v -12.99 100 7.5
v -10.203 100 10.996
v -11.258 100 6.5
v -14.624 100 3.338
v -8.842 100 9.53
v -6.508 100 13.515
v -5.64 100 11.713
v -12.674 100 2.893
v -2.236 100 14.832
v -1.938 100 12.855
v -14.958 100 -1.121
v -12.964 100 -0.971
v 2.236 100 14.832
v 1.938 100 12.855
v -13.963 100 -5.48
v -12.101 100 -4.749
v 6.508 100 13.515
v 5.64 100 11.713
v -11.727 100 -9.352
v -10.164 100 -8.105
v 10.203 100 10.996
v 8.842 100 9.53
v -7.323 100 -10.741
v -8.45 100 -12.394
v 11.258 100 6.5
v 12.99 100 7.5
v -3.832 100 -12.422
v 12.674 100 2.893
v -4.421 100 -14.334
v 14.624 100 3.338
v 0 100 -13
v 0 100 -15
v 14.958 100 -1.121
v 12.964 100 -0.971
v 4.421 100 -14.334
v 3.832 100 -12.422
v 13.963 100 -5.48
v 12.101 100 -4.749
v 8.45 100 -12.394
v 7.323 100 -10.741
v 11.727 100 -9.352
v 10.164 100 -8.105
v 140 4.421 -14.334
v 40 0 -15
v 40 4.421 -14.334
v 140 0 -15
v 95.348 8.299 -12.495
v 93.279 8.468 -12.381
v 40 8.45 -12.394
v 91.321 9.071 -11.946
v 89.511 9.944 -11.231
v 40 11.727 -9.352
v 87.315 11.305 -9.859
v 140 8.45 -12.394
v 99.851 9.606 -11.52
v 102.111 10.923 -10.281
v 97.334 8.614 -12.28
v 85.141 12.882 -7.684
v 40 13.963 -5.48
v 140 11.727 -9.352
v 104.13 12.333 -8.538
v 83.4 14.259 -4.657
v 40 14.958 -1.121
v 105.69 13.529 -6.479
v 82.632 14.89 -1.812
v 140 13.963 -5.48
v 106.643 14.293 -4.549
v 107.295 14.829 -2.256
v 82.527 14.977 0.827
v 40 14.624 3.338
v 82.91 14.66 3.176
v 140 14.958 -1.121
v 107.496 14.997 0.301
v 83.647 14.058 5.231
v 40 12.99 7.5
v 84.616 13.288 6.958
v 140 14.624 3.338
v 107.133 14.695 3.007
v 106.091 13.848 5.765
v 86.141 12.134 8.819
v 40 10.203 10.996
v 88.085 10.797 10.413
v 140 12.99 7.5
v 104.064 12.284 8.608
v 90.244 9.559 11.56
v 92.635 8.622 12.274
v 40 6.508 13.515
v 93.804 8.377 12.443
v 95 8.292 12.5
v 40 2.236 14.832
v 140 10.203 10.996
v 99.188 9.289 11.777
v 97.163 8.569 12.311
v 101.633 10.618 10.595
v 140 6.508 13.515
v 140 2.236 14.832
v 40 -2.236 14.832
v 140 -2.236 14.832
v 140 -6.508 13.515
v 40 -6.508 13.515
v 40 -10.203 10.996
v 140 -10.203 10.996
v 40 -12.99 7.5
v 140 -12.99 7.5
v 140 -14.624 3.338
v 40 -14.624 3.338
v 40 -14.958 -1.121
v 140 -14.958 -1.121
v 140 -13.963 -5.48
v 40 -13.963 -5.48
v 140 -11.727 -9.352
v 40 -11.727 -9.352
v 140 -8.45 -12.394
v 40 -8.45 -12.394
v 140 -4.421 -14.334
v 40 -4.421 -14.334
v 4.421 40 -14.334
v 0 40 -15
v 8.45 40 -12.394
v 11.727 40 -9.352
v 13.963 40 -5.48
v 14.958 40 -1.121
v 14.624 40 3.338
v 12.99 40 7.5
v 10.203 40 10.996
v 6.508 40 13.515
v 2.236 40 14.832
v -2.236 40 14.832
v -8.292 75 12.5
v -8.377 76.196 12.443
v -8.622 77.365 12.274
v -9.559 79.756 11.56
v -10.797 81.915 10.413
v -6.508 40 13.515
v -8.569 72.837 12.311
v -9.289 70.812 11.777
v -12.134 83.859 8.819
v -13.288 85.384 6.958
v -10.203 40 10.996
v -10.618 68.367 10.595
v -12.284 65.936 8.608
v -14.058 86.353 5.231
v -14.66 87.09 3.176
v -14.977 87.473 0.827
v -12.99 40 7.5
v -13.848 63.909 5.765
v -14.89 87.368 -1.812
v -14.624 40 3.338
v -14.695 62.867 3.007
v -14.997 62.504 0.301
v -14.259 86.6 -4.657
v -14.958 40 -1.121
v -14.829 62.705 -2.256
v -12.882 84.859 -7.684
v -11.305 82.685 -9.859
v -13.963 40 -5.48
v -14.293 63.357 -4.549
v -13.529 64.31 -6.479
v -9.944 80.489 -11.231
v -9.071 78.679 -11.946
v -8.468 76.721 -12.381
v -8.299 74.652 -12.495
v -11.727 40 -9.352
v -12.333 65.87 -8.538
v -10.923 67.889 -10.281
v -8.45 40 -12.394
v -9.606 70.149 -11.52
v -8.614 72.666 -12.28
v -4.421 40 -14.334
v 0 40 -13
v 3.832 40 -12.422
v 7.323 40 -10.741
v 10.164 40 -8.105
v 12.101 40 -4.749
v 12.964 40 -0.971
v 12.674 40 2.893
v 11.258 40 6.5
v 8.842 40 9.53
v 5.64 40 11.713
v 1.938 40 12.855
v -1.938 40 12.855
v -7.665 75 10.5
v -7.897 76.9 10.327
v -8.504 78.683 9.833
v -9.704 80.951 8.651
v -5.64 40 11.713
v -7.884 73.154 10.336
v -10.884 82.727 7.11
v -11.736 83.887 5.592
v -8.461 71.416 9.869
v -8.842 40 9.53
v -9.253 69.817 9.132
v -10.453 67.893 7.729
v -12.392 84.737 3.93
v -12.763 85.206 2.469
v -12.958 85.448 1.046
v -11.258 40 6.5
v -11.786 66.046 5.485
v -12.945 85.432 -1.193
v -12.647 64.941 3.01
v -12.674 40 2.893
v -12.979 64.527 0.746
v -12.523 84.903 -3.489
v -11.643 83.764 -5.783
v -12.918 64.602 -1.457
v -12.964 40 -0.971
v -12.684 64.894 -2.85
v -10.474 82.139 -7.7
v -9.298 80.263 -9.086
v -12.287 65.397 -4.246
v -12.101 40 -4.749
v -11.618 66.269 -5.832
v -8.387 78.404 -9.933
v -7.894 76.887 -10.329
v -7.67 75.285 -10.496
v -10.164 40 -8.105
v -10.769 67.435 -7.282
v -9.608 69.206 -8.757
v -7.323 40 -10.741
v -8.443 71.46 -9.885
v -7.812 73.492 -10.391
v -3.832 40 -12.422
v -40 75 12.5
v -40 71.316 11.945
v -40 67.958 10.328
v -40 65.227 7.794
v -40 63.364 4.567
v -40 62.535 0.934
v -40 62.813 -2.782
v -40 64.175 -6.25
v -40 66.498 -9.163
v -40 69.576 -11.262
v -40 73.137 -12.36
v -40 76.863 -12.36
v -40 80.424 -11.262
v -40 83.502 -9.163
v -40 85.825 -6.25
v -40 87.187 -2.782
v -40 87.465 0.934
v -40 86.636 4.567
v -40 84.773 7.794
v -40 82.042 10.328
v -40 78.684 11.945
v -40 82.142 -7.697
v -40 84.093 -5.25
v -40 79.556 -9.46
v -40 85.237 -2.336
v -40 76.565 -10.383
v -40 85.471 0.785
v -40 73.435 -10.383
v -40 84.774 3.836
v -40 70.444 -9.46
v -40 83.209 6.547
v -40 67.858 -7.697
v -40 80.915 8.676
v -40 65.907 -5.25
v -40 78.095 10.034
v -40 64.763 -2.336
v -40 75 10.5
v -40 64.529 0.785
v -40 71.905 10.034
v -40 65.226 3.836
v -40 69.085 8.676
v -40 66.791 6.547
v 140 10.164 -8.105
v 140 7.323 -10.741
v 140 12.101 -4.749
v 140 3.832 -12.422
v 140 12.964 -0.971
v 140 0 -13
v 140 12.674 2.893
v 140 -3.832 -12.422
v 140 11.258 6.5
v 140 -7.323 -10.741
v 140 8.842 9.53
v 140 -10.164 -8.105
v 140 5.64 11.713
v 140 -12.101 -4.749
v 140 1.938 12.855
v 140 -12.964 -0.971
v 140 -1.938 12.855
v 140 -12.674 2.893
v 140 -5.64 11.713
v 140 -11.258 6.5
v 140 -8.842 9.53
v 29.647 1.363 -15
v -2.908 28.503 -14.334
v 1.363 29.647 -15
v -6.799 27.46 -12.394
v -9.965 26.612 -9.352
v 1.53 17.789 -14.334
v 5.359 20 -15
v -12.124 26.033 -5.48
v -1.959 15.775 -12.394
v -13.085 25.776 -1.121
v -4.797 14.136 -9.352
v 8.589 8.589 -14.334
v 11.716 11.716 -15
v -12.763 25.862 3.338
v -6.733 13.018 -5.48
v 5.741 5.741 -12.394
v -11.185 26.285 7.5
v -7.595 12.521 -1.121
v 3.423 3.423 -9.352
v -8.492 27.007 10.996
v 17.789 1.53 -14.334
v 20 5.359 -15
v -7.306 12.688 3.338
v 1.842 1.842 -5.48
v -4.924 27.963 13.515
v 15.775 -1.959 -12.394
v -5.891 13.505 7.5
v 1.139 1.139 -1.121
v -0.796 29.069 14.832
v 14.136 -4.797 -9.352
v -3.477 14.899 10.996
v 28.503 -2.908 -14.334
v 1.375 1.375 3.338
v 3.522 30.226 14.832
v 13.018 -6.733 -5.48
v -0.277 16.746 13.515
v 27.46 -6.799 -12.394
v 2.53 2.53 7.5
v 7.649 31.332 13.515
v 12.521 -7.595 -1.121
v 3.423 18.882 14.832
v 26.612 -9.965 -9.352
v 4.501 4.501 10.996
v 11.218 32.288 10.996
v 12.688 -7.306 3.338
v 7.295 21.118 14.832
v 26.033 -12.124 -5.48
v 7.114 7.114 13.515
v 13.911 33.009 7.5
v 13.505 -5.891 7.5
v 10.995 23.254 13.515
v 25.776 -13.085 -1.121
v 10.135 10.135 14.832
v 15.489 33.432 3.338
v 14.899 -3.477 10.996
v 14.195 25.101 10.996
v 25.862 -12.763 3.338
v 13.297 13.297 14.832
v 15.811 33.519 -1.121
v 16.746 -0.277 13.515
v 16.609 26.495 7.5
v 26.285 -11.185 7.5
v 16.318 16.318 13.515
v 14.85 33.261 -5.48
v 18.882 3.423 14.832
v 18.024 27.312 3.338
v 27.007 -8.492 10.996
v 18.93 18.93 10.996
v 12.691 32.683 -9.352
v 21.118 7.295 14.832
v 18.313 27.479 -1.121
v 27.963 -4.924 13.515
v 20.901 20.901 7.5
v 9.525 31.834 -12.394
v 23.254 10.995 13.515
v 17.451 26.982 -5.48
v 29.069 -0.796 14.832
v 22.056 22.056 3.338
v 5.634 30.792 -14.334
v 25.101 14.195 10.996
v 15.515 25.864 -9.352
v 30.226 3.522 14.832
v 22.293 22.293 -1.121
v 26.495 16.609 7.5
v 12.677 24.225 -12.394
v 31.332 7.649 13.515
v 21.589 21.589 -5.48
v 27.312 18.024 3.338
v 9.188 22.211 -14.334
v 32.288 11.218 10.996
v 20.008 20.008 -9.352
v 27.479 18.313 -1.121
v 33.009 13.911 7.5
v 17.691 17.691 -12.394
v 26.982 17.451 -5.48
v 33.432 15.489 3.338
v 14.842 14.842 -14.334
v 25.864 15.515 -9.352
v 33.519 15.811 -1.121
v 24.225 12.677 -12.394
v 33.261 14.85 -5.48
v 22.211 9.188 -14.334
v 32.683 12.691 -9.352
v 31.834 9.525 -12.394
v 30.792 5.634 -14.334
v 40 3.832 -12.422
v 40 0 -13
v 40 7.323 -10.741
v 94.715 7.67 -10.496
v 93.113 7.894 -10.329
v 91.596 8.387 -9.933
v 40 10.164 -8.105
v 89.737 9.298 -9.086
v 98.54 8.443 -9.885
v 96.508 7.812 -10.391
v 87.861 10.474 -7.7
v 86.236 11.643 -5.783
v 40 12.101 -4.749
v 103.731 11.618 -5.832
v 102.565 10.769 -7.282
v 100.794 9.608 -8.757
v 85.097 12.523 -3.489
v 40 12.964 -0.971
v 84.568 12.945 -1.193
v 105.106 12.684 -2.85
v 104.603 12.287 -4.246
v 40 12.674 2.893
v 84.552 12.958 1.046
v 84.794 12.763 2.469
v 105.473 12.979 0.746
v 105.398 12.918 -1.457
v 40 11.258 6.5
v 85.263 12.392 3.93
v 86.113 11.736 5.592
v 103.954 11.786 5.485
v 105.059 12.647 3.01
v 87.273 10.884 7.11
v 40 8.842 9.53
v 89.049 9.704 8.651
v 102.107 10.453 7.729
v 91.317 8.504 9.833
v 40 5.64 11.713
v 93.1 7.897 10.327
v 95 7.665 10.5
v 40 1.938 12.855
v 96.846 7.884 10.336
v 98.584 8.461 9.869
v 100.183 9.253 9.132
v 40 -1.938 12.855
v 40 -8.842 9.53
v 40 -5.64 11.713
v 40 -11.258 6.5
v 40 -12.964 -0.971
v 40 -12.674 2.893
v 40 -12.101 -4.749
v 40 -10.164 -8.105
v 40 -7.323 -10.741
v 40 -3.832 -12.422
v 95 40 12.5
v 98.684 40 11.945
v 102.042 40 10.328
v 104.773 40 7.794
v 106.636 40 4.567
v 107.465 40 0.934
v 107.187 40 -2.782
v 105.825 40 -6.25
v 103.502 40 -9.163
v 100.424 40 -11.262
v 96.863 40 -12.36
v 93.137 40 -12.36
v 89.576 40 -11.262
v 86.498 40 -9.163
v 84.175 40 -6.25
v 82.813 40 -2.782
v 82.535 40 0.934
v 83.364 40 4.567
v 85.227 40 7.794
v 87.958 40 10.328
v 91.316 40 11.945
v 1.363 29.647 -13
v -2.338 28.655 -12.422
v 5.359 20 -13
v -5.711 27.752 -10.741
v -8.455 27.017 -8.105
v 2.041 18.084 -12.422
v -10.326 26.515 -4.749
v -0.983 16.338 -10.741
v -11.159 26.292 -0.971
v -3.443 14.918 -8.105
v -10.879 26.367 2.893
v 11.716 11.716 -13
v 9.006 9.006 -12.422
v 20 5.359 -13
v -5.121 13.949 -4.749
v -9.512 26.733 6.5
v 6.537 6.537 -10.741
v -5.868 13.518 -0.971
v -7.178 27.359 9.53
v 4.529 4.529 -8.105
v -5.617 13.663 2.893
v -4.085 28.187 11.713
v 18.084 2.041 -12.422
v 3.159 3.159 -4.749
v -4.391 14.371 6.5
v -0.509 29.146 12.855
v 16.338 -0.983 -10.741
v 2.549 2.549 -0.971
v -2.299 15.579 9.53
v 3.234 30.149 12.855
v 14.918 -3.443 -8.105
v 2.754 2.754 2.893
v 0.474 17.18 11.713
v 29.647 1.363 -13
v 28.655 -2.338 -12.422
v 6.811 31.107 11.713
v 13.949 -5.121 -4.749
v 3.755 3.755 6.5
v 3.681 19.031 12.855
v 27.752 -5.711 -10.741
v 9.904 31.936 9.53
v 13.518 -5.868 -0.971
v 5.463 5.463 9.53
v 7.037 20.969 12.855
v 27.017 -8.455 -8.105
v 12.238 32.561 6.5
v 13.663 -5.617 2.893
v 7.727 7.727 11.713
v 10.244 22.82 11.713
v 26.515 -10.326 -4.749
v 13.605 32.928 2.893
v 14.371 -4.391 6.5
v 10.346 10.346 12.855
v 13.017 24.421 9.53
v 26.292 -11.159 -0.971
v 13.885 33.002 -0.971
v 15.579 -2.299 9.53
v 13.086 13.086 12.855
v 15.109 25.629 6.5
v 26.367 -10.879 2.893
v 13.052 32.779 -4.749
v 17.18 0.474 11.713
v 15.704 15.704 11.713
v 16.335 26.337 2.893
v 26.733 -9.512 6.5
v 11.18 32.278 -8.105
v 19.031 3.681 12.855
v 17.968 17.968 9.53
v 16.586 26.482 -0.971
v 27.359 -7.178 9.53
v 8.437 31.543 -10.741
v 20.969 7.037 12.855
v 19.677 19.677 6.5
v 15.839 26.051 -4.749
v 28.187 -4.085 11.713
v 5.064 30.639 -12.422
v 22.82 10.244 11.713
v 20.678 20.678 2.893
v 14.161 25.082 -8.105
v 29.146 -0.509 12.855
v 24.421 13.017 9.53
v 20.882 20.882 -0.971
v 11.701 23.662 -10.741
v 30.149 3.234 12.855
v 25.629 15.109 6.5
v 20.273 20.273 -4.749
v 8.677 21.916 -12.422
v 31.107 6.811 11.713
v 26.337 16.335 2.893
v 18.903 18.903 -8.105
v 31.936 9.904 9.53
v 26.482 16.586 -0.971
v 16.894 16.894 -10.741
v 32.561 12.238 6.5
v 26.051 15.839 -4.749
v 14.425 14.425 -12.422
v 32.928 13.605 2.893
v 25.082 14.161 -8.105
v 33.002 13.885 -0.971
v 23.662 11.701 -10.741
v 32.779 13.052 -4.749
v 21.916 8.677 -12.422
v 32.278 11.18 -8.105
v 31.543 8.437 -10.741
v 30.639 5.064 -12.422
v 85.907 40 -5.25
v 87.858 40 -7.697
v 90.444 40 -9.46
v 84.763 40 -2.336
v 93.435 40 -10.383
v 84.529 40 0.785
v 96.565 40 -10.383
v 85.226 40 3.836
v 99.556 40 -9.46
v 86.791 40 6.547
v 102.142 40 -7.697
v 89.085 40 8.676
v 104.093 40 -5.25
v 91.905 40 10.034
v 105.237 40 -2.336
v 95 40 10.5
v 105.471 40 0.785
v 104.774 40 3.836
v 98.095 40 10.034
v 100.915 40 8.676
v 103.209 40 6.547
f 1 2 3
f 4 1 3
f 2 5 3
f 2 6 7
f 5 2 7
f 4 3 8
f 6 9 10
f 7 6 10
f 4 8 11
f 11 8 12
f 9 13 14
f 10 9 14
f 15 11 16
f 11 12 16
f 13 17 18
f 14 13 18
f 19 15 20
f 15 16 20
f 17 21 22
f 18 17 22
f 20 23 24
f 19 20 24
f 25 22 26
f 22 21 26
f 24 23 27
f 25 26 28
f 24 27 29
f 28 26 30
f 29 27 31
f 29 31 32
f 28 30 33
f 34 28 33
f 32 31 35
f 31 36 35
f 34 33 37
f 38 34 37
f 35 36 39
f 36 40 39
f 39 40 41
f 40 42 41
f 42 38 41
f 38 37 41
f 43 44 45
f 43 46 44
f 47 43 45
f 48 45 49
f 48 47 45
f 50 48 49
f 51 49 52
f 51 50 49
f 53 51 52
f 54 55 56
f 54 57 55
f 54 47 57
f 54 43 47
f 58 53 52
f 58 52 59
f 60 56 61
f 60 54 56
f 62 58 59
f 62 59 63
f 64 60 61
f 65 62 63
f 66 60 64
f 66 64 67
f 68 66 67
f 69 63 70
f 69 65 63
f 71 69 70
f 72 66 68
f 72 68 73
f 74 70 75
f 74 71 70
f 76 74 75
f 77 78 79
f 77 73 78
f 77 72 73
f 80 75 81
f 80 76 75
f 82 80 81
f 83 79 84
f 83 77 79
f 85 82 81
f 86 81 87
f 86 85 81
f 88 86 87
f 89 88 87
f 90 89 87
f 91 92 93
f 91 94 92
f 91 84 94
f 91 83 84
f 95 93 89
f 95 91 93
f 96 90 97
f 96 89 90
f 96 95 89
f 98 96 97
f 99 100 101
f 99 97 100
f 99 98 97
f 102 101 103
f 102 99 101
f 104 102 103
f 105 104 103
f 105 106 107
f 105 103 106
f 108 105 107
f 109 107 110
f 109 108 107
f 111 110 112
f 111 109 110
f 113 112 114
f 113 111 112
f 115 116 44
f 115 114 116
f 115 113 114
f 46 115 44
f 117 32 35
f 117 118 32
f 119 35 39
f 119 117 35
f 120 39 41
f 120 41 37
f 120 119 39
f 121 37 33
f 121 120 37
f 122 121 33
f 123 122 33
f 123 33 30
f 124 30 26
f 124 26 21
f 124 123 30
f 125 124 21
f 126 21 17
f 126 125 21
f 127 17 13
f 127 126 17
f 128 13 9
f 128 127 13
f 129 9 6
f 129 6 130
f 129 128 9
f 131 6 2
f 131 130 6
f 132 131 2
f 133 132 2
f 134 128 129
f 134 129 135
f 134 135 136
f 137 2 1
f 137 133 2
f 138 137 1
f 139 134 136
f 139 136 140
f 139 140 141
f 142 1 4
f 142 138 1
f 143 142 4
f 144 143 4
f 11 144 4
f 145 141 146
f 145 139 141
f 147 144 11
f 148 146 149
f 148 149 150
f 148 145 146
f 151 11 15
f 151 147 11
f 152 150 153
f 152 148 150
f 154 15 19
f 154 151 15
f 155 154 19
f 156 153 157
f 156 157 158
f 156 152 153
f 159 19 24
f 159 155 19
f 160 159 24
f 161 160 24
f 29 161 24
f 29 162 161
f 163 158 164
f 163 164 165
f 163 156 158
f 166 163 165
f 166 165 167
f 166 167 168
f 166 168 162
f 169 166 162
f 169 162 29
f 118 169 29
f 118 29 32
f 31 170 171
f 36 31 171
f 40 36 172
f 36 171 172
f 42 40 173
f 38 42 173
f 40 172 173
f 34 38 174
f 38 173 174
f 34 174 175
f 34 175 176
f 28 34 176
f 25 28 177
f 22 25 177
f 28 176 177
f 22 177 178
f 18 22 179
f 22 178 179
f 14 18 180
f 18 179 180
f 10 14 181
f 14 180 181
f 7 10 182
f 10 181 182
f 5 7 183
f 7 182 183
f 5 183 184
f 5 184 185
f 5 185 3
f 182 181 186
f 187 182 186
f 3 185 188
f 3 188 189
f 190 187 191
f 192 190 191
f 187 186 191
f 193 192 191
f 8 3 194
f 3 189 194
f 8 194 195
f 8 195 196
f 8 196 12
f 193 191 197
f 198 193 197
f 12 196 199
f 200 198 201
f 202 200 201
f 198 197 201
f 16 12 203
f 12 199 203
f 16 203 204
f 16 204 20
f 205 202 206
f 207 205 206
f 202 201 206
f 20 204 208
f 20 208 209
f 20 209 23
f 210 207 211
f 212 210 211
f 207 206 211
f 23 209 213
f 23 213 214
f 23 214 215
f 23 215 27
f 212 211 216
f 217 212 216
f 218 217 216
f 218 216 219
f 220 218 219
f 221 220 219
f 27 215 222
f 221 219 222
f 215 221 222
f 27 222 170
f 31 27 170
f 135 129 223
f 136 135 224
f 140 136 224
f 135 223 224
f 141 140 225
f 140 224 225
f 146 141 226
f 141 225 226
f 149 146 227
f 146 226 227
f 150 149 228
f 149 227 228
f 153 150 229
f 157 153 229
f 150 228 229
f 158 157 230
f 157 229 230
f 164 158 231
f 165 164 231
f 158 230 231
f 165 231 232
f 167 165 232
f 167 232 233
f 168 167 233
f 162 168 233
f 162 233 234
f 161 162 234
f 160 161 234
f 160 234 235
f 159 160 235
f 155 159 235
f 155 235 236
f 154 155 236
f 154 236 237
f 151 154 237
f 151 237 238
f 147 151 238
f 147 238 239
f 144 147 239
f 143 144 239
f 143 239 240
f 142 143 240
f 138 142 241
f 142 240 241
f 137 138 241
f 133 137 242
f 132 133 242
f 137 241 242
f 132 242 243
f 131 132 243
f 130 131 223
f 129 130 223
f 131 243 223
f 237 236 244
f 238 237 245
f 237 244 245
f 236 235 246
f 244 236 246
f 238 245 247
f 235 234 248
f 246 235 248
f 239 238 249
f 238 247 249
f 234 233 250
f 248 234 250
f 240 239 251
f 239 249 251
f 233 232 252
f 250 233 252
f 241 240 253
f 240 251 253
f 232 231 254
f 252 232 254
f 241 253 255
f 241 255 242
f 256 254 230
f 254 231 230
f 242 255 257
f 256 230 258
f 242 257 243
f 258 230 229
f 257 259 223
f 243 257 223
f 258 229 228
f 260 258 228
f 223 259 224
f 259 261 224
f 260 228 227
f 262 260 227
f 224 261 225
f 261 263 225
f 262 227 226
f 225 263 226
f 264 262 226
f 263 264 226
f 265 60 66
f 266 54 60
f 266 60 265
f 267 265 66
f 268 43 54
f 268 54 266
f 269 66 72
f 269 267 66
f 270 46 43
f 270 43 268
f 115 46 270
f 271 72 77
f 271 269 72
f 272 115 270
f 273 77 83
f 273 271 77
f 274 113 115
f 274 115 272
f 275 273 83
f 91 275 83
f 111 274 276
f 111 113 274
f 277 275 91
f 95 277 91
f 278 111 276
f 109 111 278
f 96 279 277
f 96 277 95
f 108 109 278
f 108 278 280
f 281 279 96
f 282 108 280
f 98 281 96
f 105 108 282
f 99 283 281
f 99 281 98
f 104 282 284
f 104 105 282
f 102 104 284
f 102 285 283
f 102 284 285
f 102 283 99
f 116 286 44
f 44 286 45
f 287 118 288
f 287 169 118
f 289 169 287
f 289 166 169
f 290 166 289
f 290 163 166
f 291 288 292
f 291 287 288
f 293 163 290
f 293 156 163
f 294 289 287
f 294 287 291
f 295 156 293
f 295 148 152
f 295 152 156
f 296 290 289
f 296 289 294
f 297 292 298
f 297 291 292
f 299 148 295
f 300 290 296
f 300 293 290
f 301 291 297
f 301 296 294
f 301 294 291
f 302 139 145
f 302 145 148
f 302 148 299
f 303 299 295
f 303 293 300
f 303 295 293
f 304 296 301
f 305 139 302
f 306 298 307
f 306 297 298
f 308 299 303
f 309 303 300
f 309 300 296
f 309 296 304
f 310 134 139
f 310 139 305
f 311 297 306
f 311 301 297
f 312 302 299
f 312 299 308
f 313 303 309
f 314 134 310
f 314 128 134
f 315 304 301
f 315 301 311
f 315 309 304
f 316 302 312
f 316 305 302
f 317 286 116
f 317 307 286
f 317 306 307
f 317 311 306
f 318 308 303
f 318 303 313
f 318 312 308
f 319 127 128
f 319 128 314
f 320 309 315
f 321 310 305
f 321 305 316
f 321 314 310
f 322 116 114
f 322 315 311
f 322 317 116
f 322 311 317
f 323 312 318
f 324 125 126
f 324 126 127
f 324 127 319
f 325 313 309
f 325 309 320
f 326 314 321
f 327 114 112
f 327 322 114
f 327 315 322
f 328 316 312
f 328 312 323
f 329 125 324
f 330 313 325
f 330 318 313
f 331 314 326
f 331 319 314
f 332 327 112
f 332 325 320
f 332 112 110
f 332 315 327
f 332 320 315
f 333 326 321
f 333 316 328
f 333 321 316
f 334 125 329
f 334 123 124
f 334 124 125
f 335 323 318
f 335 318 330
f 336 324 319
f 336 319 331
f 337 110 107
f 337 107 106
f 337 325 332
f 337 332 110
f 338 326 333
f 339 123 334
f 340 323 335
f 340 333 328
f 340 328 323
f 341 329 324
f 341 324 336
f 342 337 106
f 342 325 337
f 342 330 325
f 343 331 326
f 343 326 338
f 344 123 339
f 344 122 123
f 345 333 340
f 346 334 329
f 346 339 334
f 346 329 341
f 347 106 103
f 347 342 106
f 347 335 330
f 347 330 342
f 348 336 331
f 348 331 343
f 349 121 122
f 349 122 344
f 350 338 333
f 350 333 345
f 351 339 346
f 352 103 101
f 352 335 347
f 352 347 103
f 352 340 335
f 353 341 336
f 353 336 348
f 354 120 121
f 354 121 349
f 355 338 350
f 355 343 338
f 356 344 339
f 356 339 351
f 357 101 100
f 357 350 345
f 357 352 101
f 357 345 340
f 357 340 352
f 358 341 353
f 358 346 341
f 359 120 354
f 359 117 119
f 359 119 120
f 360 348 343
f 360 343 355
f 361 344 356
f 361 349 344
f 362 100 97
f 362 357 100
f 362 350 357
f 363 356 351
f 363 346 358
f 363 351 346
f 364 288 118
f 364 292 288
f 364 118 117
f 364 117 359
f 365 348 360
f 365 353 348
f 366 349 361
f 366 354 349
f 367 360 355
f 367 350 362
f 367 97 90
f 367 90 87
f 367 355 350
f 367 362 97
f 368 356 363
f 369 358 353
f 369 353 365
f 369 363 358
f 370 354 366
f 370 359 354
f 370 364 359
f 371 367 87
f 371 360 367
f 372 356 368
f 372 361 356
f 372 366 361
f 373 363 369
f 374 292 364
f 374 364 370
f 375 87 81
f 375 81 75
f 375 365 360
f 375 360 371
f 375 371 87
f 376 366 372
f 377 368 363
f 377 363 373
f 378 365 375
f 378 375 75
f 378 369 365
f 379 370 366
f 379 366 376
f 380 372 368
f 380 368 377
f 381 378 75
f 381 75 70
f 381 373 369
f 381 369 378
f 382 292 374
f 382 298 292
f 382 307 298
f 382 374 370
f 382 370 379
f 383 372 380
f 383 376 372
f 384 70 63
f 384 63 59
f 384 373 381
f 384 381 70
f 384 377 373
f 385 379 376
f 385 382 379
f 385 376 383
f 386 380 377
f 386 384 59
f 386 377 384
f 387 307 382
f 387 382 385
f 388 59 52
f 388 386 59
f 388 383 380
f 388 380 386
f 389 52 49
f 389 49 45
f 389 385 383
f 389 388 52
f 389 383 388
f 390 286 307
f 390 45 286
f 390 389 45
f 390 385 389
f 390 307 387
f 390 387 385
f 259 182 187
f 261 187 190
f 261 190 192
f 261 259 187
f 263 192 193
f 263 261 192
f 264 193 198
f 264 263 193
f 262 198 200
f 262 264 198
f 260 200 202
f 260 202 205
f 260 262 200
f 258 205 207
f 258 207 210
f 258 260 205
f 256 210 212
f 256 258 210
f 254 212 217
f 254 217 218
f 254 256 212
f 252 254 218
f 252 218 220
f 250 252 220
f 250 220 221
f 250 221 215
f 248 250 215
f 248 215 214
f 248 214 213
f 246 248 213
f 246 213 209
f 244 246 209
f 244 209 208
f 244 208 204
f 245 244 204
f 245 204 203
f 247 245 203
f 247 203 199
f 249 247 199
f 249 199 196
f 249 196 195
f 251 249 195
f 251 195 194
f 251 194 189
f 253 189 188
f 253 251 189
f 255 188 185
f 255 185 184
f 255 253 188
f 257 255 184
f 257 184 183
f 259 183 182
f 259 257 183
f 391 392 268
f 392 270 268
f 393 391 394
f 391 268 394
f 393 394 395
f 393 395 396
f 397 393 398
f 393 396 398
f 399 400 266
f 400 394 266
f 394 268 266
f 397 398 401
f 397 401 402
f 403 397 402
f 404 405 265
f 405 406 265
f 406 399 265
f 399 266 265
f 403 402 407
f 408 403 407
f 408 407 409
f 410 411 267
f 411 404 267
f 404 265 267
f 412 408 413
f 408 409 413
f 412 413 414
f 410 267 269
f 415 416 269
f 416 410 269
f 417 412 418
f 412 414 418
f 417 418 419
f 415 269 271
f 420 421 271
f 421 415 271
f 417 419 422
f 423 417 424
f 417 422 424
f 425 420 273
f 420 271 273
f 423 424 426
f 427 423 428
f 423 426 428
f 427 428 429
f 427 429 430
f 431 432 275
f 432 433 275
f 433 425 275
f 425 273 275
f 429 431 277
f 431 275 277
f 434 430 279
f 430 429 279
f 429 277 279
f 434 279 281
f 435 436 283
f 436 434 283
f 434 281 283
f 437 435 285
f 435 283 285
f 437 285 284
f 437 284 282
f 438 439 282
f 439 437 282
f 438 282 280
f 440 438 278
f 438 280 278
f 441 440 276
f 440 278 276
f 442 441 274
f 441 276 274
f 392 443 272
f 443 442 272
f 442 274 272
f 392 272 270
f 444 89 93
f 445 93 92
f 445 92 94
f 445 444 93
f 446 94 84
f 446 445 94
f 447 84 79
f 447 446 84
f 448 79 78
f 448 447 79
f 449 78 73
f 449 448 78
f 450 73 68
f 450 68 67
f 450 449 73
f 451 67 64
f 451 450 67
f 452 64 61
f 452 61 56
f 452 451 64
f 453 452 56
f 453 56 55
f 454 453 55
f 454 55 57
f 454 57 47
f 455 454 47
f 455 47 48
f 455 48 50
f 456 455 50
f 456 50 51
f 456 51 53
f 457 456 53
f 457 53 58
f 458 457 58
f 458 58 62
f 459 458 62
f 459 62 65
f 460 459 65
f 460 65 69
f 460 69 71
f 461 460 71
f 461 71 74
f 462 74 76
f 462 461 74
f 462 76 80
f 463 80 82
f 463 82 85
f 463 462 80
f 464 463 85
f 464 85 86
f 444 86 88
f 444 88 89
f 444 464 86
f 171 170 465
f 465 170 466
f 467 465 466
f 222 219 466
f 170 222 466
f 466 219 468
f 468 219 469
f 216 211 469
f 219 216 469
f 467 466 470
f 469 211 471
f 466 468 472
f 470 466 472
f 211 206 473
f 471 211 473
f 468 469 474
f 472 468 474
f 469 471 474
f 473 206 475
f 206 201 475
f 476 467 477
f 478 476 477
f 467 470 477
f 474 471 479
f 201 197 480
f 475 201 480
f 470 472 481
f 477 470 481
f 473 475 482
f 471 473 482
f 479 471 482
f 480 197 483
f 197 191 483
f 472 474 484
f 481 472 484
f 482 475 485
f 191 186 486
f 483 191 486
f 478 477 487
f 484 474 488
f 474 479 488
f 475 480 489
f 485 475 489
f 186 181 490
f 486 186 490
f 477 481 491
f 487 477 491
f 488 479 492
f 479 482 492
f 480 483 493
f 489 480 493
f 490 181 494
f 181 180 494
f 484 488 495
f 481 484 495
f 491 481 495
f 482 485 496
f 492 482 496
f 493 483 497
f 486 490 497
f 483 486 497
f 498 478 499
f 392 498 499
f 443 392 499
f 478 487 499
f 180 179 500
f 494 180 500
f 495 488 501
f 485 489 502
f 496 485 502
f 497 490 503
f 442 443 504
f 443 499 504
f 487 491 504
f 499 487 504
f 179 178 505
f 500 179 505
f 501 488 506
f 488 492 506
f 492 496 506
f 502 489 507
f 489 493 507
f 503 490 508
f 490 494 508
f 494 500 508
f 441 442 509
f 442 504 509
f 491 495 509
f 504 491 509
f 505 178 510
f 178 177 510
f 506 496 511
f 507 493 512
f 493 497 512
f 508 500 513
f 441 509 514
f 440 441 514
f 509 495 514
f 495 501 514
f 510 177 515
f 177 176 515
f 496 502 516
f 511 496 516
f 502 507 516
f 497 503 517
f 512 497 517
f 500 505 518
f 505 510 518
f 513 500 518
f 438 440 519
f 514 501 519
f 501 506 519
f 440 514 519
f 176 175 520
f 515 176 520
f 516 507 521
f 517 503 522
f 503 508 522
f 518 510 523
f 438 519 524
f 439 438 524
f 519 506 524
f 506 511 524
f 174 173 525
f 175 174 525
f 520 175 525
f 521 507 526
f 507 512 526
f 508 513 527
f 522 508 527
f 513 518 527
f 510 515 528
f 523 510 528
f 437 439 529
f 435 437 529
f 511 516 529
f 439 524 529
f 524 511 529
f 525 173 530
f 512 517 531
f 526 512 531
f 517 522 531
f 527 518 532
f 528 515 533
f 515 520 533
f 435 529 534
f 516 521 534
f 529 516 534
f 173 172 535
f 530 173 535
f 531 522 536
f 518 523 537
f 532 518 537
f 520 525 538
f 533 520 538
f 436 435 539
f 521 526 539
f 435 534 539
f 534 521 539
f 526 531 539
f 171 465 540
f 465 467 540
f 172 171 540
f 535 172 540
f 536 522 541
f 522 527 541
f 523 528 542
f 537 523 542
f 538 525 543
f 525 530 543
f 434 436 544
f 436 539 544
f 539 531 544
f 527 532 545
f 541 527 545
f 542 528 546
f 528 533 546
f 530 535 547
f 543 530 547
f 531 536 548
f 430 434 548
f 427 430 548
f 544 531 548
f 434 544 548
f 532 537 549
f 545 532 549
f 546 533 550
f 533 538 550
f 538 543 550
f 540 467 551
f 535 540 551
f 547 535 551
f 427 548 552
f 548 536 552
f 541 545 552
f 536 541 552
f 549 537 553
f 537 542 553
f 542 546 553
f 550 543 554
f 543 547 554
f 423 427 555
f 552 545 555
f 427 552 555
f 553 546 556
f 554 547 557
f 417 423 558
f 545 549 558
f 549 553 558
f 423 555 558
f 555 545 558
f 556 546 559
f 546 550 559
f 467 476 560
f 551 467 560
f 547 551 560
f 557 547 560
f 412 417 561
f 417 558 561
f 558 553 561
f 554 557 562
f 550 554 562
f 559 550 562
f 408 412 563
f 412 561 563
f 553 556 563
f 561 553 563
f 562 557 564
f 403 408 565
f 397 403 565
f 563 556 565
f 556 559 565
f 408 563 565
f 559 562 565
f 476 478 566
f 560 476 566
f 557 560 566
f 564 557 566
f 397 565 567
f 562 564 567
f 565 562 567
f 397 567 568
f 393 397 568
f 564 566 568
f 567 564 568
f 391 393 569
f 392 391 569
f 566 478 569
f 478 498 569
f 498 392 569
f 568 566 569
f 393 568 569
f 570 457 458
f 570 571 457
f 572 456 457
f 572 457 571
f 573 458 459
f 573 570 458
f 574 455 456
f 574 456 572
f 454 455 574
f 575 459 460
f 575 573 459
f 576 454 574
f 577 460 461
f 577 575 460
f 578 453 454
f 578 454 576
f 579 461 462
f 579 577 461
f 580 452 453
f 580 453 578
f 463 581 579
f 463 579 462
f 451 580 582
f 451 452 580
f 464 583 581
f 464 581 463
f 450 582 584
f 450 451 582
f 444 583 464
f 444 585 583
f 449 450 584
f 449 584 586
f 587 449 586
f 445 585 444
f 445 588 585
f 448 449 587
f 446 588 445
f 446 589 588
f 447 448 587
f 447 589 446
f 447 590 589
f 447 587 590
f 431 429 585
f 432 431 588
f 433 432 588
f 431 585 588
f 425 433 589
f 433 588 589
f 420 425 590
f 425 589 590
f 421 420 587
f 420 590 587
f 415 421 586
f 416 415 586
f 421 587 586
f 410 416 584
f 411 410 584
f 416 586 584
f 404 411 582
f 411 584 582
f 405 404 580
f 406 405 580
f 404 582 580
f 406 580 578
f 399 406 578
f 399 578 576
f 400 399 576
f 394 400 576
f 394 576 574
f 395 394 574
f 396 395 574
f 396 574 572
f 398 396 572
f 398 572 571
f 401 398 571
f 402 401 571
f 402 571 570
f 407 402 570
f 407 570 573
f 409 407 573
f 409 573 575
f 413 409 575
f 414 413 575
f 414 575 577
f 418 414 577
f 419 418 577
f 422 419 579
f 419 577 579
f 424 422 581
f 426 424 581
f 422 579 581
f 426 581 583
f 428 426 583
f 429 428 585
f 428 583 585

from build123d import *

# Parameters (mm, degrees)
SKETCH_2_R           = 15
EXTRUDE_1_REACH      = 155.052
EXTRUDE_1_END_RADIUS = 15
SKETCH_3_R           = 12.5
EXTRUDE_2_REACH      = 208.458
EXTRUDE_2_END_RADIUS = 15
SKETCH_4_R           = 12.5
SHELL_1_T            = -2


with BuildPart() as part:
    # 스윕1: sweep along a path in 스케치1
    with BuildLine(Plane.XY) as sweep_1_path:
        Line((0, 100), (0, 40))
        ThreePointArc((0, 40), (11.715728753, 11.715728753), (40, 0))
        Line((40, 0), (140, 0))
    # 스케치2 → 스윕1 (sweep)
    with BuildSketch(Plane(origin=(140, 0, 0), x_dir=(0, 0, -1), z_dir=(1, 0, 0))):
        Circle(SKETCH_2_R)
    sweep(path=sweep_1_path.line)

    # 보스-돌출1: up to this cylinder (the profile starts outside it)
    extrude_1_end = Plane(origin=(95, 0, 0), z_dir=(1, 0, 0)) * Cylinder(EXTRUDE_1_END_RADIUS, 341.104, mode=Mode.PRIVATE)
    # 스케치3 → 보스-돌출1 (add, up to the surface)
    with BuildSketch(Plane(origin=(0, 40, 0), x_dir=(1, 0, 0), z_dir=(0, 1, 0)), mode=Mode.PRIVATE) as extrude_1_sk1:
        with Locations(Location((95, 0, 0), (0, 0, 270))):
            Circle(SKETCH_3_R)
    extrude_1_tool1 = extrude(extrude_1_sk1.sketch, amount=-EXTRUDE_1_REACH, mode=Mode.PRIVATE) - extrude_1_end
    add(extrude_1_tool1.solids().sort_by_distance((95, 40, 0))[0])

    # 보스-돌출2: up to this cylinder (the profile starts outside it)
    extrude_2_end = Plane(origin=(0, 75, 0), z_dir=(0, -1, 0)) * Cylinder(EXTRUDE_2_END_RADIUS, 447.916, mode=Mode.PRIVATE)
    # 스케치4 → 보스-돌출2 (add, up to the surface)
    with BuildSketch(Plane(origin=(-40, 0, 0), x_dir=(0, 0, -1), z_dir=(1, 0, 0)), mode=Mode.PRIVATE) as extrude_2_sk1:
        with Locations(Location((0, 75, 0), (0, 0, 180))):
            Circle(SKETCH_4_R)
    extrude_2_tool1 = extrude(extrude_2_sk1.sketch, amount=EXTRUDE_2_REACH, mode=Mode.PRIVATE) - extrude_2_end
    add(extrude_2_tool1.solids().sort_by_distance((-40, 75, 0))[0])

    # 쉘1
    shell_1_openings = [part.faces().sort_by_distance(p)[0] for p in [
        (95, 40, 0),
        (-40, 75, 0),
        (140, 0, 0),
        (0, 100, 0),
    ]]
    offset(amount=SHELL_1_T, openings=shell_1_openings, kind=Kind.INTERSECTION)


solid = part.part
